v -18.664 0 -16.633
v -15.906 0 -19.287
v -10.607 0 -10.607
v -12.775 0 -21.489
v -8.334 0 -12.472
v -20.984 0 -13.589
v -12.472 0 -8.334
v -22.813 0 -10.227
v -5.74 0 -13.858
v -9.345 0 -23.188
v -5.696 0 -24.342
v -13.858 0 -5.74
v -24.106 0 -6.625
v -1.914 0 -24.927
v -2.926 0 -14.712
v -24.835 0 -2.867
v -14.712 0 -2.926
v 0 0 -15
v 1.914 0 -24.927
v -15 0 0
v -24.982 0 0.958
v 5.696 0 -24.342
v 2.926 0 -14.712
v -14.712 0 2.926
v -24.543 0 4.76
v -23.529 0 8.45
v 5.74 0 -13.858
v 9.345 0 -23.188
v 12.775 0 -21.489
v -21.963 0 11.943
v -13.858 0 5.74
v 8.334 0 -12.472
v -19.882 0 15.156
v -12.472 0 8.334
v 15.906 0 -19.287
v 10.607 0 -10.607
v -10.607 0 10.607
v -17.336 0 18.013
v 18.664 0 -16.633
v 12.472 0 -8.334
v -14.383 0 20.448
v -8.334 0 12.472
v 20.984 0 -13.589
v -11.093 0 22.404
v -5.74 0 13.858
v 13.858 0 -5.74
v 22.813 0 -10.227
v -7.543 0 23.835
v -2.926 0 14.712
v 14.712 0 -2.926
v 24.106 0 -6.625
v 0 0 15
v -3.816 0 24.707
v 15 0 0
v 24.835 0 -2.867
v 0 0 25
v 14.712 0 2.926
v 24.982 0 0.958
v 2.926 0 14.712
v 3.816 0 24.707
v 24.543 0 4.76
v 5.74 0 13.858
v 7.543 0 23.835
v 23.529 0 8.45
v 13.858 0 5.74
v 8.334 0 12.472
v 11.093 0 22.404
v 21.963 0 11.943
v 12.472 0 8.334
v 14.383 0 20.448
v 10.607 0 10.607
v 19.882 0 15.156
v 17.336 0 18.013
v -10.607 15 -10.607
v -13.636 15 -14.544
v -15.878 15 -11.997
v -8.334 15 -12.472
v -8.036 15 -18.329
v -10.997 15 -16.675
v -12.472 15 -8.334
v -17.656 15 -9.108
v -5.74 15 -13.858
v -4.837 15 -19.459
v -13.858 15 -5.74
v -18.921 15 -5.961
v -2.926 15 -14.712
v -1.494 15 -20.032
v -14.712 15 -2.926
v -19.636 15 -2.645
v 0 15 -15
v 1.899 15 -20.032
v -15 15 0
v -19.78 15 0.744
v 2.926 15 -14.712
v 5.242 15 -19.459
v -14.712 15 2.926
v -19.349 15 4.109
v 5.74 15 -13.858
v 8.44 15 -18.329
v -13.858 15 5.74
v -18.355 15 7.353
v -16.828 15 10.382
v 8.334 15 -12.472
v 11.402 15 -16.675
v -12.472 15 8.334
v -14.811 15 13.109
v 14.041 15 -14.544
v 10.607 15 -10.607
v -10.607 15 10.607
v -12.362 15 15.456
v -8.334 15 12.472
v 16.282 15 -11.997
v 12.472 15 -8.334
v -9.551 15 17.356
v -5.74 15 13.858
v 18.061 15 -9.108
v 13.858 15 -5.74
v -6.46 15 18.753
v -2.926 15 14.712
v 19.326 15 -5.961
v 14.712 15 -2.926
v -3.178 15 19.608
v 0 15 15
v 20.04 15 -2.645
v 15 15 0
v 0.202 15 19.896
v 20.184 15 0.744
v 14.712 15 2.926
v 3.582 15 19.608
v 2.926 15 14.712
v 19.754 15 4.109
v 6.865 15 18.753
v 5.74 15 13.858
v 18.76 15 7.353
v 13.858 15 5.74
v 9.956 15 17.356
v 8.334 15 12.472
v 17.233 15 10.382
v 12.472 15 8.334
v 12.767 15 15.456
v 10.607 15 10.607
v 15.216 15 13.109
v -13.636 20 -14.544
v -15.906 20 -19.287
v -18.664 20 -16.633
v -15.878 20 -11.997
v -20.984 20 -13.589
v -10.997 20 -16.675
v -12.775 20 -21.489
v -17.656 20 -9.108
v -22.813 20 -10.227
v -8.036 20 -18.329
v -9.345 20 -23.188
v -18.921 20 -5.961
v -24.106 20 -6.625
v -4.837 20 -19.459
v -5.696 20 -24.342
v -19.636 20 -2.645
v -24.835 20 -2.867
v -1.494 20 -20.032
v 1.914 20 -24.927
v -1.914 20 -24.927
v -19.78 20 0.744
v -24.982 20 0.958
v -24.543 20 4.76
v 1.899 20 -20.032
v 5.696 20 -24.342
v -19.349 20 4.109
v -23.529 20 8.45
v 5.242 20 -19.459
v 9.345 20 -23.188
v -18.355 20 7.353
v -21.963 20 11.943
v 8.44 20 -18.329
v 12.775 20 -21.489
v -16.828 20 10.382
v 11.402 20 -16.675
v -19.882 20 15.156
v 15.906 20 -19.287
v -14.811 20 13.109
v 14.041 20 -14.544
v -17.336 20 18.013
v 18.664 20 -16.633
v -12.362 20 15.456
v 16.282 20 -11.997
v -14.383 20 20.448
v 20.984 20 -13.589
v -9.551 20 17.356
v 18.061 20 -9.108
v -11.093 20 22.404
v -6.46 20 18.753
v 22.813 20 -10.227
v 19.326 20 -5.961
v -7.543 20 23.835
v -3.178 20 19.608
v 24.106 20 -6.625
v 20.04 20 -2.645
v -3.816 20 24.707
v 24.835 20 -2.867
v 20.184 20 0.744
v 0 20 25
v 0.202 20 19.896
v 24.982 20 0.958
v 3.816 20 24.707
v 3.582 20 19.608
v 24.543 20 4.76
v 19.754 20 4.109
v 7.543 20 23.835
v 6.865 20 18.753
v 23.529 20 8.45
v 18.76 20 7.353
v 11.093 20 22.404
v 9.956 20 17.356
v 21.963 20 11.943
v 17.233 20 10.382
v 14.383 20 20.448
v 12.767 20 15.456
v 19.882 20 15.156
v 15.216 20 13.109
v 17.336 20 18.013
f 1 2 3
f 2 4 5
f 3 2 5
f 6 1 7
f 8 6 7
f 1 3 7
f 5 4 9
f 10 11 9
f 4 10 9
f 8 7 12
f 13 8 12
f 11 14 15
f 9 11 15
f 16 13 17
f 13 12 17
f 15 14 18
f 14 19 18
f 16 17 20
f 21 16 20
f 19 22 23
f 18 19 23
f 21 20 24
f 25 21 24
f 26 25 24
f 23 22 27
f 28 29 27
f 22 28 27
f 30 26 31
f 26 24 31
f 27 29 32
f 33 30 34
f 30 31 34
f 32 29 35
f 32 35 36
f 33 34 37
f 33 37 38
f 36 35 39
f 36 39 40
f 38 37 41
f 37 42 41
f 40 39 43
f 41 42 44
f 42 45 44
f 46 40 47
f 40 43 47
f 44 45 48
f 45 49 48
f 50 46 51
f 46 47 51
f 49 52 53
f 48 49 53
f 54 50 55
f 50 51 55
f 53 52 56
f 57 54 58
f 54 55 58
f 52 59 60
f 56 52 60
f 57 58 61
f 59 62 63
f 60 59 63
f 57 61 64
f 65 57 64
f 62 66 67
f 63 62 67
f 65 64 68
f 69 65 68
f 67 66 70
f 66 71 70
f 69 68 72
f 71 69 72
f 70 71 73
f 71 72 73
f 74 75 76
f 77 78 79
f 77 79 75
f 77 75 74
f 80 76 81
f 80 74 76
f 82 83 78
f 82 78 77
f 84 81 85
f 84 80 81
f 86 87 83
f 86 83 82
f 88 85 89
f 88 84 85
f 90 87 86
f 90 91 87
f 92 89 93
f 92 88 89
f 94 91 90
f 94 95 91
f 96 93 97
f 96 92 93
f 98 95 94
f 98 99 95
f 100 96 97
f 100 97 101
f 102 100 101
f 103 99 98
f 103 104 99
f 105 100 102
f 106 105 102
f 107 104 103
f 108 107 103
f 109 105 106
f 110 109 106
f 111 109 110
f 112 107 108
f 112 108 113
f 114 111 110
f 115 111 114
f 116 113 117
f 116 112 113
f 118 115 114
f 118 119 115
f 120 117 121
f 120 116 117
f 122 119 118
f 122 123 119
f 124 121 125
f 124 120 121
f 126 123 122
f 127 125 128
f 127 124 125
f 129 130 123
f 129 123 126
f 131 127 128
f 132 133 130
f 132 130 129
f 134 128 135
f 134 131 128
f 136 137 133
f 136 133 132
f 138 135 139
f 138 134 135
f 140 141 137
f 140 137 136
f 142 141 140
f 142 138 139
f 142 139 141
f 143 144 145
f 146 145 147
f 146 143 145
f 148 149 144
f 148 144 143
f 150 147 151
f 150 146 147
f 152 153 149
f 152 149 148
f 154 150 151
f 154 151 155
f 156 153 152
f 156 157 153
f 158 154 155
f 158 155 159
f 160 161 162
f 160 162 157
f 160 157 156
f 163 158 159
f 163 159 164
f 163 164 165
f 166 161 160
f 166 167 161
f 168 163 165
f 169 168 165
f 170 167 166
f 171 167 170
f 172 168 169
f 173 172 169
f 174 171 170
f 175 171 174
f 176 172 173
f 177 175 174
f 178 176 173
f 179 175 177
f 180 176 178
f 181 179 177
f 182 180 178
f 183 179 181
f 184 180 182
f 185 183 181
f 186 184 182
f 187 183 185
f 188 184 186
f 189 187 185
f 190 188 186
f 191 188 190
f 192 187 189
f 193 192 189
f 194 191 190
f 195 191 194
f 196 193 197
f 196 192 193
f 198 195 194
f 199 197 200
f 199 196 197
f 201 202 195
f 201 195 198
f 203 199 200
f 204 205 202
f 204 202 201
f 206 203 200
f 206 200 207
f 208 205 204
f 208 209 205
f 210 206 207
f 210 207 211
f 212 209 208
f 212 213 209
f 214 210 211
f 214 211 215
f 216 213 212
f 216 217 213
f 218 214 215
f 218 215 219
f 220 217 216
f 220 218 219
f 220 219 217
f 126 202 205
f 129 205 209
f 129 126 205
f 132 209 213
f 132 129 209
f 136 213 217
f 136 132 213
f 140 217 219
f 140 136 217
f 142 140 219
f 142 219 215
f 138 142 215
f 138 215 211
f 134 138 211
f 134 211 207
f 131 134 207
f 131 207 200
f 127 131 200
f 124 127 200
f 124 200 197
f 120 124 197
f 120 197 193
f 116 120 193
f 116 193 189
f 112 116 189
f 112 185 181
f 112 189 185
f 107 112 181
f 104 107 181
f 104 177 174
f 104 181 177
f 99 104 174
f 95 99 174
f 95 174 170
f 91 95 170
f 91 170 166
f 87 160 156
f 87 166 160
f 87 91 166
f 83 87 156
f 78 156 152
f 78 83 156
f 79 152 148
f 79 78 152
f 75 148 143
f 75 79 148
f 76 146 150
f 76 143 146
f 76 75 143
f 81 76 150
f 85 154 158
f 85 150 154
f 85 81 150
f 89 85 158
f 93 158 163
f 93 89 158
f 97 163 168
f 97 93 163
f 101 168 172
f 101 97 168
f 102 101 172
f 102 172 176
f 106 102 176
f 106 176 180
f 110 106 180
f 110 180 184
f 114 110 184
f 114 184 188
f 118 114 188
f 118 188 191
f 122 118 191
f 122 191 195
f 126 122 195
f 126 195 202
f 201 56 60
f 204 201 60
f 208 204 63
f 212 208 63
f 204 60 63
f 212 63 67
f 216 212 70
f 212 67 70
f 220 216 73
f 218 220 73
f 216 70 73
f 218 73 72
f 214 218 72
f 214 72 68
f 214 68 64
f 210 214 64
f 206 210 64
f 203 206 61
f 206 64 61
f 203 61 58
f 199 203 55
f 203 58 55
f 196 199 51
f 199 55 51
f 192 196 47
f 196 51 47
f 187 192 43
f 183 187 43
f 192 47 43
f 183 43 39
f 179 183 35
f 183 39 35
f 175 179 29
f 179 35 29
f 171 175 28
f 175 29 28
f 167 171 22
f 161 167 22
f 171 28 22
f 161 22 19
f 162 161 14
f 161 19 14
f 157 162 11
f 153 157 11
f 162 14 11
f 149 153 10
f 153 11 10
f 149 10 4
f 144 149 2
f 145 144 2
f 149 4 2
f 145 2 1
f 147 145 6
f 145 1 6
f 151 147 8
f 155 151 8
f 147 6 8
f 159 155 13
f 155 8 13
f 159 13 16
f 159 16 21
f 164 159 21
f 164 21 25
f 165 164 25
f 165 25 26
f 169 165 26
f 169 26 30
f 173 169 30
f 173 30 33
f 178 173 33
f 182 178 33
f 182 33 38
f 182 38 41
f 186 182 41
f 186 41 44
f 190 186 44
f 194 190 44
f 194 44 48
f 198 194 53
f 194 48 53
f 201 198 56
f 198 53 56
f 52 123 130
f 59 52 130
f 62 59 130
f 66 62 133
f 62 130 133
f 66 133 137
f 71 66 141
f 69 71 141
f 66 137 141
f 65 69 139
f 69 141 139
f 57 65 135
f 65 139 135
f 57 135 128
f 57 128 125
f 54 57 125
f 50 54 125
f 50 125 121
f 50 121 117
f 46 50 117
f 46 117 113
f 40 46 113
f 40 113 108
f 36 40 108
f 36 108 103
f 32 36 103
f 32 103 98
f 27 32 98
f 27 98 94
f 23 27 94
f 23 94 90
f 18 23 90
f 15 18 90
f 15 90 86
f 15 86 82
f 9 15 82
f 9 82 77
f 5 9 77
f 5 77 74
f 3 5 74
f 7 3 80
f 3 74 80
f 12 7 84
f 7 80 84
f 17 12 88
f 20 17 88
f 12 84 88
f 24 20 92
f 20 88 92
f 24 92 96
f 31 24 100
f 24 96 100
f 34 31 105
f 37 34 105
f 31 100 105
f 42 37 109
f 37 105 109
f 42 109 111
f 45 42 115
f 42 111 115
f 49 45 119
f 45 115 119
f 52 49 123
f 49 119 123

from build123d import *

# Parameters (mm, degrees)
SKETCH1_R               = 25
BOSS_EXTRUDE5_DEPTH     = 20
CUT_EXTRUDE2_DEPTH      = 1
CUT_EXTRUDE2_DEPTH_BACK = 5
SKETCH5_R               = 20
SKETCH9_R               = 15
CUT_EXTRUDE3_DEPTH      = 29


with BuildPart() as part:
    # Sketch1 → Boss-Extrude5 (new body)
    with BuildSketch(Plane(origin=(0, 0, 0), x_dir=(1, 0, 0), z_dir=(0, 1, 0))):
        Circle(SKETCH1_R)
    extrude(amount=BOSS_EXTRUDE5_DEPTH)

    # Sketch5 → Cut-Extrude2 (cut, two sides: drawn at the far end of the back side and taken through both)
    with BuildSketch(Plane(origin=(0, 20, 0), x_dir=(1, 0, 0), z_dir=(0, 1, 0)).offset(-CUT_EXTRUDE2_DEPTH_BACK)):
        with Locations((0.202413874, 0.104402365)):
            Circle(SKETCH5_R)
    extrude(amount=CUT_EXTRUDE2_DEPTH + CUT_EXTRUDE2_DEPTH_BACK, mode=Mode.SUBTRACT)

    # Sketch9 → Cut-Extrude3 (cut)
    with BuildSketch(Plane(origin=(0, 15, 0), x_dir=(1, 0, 0), z_dir=(0, 1, 0))):
        Circle(SKETCH9_R)
    extrude(amount=-CUT_EXTRUDE3_DEPTH, mode=Mode.SUBTRACT)


solid = part.part
